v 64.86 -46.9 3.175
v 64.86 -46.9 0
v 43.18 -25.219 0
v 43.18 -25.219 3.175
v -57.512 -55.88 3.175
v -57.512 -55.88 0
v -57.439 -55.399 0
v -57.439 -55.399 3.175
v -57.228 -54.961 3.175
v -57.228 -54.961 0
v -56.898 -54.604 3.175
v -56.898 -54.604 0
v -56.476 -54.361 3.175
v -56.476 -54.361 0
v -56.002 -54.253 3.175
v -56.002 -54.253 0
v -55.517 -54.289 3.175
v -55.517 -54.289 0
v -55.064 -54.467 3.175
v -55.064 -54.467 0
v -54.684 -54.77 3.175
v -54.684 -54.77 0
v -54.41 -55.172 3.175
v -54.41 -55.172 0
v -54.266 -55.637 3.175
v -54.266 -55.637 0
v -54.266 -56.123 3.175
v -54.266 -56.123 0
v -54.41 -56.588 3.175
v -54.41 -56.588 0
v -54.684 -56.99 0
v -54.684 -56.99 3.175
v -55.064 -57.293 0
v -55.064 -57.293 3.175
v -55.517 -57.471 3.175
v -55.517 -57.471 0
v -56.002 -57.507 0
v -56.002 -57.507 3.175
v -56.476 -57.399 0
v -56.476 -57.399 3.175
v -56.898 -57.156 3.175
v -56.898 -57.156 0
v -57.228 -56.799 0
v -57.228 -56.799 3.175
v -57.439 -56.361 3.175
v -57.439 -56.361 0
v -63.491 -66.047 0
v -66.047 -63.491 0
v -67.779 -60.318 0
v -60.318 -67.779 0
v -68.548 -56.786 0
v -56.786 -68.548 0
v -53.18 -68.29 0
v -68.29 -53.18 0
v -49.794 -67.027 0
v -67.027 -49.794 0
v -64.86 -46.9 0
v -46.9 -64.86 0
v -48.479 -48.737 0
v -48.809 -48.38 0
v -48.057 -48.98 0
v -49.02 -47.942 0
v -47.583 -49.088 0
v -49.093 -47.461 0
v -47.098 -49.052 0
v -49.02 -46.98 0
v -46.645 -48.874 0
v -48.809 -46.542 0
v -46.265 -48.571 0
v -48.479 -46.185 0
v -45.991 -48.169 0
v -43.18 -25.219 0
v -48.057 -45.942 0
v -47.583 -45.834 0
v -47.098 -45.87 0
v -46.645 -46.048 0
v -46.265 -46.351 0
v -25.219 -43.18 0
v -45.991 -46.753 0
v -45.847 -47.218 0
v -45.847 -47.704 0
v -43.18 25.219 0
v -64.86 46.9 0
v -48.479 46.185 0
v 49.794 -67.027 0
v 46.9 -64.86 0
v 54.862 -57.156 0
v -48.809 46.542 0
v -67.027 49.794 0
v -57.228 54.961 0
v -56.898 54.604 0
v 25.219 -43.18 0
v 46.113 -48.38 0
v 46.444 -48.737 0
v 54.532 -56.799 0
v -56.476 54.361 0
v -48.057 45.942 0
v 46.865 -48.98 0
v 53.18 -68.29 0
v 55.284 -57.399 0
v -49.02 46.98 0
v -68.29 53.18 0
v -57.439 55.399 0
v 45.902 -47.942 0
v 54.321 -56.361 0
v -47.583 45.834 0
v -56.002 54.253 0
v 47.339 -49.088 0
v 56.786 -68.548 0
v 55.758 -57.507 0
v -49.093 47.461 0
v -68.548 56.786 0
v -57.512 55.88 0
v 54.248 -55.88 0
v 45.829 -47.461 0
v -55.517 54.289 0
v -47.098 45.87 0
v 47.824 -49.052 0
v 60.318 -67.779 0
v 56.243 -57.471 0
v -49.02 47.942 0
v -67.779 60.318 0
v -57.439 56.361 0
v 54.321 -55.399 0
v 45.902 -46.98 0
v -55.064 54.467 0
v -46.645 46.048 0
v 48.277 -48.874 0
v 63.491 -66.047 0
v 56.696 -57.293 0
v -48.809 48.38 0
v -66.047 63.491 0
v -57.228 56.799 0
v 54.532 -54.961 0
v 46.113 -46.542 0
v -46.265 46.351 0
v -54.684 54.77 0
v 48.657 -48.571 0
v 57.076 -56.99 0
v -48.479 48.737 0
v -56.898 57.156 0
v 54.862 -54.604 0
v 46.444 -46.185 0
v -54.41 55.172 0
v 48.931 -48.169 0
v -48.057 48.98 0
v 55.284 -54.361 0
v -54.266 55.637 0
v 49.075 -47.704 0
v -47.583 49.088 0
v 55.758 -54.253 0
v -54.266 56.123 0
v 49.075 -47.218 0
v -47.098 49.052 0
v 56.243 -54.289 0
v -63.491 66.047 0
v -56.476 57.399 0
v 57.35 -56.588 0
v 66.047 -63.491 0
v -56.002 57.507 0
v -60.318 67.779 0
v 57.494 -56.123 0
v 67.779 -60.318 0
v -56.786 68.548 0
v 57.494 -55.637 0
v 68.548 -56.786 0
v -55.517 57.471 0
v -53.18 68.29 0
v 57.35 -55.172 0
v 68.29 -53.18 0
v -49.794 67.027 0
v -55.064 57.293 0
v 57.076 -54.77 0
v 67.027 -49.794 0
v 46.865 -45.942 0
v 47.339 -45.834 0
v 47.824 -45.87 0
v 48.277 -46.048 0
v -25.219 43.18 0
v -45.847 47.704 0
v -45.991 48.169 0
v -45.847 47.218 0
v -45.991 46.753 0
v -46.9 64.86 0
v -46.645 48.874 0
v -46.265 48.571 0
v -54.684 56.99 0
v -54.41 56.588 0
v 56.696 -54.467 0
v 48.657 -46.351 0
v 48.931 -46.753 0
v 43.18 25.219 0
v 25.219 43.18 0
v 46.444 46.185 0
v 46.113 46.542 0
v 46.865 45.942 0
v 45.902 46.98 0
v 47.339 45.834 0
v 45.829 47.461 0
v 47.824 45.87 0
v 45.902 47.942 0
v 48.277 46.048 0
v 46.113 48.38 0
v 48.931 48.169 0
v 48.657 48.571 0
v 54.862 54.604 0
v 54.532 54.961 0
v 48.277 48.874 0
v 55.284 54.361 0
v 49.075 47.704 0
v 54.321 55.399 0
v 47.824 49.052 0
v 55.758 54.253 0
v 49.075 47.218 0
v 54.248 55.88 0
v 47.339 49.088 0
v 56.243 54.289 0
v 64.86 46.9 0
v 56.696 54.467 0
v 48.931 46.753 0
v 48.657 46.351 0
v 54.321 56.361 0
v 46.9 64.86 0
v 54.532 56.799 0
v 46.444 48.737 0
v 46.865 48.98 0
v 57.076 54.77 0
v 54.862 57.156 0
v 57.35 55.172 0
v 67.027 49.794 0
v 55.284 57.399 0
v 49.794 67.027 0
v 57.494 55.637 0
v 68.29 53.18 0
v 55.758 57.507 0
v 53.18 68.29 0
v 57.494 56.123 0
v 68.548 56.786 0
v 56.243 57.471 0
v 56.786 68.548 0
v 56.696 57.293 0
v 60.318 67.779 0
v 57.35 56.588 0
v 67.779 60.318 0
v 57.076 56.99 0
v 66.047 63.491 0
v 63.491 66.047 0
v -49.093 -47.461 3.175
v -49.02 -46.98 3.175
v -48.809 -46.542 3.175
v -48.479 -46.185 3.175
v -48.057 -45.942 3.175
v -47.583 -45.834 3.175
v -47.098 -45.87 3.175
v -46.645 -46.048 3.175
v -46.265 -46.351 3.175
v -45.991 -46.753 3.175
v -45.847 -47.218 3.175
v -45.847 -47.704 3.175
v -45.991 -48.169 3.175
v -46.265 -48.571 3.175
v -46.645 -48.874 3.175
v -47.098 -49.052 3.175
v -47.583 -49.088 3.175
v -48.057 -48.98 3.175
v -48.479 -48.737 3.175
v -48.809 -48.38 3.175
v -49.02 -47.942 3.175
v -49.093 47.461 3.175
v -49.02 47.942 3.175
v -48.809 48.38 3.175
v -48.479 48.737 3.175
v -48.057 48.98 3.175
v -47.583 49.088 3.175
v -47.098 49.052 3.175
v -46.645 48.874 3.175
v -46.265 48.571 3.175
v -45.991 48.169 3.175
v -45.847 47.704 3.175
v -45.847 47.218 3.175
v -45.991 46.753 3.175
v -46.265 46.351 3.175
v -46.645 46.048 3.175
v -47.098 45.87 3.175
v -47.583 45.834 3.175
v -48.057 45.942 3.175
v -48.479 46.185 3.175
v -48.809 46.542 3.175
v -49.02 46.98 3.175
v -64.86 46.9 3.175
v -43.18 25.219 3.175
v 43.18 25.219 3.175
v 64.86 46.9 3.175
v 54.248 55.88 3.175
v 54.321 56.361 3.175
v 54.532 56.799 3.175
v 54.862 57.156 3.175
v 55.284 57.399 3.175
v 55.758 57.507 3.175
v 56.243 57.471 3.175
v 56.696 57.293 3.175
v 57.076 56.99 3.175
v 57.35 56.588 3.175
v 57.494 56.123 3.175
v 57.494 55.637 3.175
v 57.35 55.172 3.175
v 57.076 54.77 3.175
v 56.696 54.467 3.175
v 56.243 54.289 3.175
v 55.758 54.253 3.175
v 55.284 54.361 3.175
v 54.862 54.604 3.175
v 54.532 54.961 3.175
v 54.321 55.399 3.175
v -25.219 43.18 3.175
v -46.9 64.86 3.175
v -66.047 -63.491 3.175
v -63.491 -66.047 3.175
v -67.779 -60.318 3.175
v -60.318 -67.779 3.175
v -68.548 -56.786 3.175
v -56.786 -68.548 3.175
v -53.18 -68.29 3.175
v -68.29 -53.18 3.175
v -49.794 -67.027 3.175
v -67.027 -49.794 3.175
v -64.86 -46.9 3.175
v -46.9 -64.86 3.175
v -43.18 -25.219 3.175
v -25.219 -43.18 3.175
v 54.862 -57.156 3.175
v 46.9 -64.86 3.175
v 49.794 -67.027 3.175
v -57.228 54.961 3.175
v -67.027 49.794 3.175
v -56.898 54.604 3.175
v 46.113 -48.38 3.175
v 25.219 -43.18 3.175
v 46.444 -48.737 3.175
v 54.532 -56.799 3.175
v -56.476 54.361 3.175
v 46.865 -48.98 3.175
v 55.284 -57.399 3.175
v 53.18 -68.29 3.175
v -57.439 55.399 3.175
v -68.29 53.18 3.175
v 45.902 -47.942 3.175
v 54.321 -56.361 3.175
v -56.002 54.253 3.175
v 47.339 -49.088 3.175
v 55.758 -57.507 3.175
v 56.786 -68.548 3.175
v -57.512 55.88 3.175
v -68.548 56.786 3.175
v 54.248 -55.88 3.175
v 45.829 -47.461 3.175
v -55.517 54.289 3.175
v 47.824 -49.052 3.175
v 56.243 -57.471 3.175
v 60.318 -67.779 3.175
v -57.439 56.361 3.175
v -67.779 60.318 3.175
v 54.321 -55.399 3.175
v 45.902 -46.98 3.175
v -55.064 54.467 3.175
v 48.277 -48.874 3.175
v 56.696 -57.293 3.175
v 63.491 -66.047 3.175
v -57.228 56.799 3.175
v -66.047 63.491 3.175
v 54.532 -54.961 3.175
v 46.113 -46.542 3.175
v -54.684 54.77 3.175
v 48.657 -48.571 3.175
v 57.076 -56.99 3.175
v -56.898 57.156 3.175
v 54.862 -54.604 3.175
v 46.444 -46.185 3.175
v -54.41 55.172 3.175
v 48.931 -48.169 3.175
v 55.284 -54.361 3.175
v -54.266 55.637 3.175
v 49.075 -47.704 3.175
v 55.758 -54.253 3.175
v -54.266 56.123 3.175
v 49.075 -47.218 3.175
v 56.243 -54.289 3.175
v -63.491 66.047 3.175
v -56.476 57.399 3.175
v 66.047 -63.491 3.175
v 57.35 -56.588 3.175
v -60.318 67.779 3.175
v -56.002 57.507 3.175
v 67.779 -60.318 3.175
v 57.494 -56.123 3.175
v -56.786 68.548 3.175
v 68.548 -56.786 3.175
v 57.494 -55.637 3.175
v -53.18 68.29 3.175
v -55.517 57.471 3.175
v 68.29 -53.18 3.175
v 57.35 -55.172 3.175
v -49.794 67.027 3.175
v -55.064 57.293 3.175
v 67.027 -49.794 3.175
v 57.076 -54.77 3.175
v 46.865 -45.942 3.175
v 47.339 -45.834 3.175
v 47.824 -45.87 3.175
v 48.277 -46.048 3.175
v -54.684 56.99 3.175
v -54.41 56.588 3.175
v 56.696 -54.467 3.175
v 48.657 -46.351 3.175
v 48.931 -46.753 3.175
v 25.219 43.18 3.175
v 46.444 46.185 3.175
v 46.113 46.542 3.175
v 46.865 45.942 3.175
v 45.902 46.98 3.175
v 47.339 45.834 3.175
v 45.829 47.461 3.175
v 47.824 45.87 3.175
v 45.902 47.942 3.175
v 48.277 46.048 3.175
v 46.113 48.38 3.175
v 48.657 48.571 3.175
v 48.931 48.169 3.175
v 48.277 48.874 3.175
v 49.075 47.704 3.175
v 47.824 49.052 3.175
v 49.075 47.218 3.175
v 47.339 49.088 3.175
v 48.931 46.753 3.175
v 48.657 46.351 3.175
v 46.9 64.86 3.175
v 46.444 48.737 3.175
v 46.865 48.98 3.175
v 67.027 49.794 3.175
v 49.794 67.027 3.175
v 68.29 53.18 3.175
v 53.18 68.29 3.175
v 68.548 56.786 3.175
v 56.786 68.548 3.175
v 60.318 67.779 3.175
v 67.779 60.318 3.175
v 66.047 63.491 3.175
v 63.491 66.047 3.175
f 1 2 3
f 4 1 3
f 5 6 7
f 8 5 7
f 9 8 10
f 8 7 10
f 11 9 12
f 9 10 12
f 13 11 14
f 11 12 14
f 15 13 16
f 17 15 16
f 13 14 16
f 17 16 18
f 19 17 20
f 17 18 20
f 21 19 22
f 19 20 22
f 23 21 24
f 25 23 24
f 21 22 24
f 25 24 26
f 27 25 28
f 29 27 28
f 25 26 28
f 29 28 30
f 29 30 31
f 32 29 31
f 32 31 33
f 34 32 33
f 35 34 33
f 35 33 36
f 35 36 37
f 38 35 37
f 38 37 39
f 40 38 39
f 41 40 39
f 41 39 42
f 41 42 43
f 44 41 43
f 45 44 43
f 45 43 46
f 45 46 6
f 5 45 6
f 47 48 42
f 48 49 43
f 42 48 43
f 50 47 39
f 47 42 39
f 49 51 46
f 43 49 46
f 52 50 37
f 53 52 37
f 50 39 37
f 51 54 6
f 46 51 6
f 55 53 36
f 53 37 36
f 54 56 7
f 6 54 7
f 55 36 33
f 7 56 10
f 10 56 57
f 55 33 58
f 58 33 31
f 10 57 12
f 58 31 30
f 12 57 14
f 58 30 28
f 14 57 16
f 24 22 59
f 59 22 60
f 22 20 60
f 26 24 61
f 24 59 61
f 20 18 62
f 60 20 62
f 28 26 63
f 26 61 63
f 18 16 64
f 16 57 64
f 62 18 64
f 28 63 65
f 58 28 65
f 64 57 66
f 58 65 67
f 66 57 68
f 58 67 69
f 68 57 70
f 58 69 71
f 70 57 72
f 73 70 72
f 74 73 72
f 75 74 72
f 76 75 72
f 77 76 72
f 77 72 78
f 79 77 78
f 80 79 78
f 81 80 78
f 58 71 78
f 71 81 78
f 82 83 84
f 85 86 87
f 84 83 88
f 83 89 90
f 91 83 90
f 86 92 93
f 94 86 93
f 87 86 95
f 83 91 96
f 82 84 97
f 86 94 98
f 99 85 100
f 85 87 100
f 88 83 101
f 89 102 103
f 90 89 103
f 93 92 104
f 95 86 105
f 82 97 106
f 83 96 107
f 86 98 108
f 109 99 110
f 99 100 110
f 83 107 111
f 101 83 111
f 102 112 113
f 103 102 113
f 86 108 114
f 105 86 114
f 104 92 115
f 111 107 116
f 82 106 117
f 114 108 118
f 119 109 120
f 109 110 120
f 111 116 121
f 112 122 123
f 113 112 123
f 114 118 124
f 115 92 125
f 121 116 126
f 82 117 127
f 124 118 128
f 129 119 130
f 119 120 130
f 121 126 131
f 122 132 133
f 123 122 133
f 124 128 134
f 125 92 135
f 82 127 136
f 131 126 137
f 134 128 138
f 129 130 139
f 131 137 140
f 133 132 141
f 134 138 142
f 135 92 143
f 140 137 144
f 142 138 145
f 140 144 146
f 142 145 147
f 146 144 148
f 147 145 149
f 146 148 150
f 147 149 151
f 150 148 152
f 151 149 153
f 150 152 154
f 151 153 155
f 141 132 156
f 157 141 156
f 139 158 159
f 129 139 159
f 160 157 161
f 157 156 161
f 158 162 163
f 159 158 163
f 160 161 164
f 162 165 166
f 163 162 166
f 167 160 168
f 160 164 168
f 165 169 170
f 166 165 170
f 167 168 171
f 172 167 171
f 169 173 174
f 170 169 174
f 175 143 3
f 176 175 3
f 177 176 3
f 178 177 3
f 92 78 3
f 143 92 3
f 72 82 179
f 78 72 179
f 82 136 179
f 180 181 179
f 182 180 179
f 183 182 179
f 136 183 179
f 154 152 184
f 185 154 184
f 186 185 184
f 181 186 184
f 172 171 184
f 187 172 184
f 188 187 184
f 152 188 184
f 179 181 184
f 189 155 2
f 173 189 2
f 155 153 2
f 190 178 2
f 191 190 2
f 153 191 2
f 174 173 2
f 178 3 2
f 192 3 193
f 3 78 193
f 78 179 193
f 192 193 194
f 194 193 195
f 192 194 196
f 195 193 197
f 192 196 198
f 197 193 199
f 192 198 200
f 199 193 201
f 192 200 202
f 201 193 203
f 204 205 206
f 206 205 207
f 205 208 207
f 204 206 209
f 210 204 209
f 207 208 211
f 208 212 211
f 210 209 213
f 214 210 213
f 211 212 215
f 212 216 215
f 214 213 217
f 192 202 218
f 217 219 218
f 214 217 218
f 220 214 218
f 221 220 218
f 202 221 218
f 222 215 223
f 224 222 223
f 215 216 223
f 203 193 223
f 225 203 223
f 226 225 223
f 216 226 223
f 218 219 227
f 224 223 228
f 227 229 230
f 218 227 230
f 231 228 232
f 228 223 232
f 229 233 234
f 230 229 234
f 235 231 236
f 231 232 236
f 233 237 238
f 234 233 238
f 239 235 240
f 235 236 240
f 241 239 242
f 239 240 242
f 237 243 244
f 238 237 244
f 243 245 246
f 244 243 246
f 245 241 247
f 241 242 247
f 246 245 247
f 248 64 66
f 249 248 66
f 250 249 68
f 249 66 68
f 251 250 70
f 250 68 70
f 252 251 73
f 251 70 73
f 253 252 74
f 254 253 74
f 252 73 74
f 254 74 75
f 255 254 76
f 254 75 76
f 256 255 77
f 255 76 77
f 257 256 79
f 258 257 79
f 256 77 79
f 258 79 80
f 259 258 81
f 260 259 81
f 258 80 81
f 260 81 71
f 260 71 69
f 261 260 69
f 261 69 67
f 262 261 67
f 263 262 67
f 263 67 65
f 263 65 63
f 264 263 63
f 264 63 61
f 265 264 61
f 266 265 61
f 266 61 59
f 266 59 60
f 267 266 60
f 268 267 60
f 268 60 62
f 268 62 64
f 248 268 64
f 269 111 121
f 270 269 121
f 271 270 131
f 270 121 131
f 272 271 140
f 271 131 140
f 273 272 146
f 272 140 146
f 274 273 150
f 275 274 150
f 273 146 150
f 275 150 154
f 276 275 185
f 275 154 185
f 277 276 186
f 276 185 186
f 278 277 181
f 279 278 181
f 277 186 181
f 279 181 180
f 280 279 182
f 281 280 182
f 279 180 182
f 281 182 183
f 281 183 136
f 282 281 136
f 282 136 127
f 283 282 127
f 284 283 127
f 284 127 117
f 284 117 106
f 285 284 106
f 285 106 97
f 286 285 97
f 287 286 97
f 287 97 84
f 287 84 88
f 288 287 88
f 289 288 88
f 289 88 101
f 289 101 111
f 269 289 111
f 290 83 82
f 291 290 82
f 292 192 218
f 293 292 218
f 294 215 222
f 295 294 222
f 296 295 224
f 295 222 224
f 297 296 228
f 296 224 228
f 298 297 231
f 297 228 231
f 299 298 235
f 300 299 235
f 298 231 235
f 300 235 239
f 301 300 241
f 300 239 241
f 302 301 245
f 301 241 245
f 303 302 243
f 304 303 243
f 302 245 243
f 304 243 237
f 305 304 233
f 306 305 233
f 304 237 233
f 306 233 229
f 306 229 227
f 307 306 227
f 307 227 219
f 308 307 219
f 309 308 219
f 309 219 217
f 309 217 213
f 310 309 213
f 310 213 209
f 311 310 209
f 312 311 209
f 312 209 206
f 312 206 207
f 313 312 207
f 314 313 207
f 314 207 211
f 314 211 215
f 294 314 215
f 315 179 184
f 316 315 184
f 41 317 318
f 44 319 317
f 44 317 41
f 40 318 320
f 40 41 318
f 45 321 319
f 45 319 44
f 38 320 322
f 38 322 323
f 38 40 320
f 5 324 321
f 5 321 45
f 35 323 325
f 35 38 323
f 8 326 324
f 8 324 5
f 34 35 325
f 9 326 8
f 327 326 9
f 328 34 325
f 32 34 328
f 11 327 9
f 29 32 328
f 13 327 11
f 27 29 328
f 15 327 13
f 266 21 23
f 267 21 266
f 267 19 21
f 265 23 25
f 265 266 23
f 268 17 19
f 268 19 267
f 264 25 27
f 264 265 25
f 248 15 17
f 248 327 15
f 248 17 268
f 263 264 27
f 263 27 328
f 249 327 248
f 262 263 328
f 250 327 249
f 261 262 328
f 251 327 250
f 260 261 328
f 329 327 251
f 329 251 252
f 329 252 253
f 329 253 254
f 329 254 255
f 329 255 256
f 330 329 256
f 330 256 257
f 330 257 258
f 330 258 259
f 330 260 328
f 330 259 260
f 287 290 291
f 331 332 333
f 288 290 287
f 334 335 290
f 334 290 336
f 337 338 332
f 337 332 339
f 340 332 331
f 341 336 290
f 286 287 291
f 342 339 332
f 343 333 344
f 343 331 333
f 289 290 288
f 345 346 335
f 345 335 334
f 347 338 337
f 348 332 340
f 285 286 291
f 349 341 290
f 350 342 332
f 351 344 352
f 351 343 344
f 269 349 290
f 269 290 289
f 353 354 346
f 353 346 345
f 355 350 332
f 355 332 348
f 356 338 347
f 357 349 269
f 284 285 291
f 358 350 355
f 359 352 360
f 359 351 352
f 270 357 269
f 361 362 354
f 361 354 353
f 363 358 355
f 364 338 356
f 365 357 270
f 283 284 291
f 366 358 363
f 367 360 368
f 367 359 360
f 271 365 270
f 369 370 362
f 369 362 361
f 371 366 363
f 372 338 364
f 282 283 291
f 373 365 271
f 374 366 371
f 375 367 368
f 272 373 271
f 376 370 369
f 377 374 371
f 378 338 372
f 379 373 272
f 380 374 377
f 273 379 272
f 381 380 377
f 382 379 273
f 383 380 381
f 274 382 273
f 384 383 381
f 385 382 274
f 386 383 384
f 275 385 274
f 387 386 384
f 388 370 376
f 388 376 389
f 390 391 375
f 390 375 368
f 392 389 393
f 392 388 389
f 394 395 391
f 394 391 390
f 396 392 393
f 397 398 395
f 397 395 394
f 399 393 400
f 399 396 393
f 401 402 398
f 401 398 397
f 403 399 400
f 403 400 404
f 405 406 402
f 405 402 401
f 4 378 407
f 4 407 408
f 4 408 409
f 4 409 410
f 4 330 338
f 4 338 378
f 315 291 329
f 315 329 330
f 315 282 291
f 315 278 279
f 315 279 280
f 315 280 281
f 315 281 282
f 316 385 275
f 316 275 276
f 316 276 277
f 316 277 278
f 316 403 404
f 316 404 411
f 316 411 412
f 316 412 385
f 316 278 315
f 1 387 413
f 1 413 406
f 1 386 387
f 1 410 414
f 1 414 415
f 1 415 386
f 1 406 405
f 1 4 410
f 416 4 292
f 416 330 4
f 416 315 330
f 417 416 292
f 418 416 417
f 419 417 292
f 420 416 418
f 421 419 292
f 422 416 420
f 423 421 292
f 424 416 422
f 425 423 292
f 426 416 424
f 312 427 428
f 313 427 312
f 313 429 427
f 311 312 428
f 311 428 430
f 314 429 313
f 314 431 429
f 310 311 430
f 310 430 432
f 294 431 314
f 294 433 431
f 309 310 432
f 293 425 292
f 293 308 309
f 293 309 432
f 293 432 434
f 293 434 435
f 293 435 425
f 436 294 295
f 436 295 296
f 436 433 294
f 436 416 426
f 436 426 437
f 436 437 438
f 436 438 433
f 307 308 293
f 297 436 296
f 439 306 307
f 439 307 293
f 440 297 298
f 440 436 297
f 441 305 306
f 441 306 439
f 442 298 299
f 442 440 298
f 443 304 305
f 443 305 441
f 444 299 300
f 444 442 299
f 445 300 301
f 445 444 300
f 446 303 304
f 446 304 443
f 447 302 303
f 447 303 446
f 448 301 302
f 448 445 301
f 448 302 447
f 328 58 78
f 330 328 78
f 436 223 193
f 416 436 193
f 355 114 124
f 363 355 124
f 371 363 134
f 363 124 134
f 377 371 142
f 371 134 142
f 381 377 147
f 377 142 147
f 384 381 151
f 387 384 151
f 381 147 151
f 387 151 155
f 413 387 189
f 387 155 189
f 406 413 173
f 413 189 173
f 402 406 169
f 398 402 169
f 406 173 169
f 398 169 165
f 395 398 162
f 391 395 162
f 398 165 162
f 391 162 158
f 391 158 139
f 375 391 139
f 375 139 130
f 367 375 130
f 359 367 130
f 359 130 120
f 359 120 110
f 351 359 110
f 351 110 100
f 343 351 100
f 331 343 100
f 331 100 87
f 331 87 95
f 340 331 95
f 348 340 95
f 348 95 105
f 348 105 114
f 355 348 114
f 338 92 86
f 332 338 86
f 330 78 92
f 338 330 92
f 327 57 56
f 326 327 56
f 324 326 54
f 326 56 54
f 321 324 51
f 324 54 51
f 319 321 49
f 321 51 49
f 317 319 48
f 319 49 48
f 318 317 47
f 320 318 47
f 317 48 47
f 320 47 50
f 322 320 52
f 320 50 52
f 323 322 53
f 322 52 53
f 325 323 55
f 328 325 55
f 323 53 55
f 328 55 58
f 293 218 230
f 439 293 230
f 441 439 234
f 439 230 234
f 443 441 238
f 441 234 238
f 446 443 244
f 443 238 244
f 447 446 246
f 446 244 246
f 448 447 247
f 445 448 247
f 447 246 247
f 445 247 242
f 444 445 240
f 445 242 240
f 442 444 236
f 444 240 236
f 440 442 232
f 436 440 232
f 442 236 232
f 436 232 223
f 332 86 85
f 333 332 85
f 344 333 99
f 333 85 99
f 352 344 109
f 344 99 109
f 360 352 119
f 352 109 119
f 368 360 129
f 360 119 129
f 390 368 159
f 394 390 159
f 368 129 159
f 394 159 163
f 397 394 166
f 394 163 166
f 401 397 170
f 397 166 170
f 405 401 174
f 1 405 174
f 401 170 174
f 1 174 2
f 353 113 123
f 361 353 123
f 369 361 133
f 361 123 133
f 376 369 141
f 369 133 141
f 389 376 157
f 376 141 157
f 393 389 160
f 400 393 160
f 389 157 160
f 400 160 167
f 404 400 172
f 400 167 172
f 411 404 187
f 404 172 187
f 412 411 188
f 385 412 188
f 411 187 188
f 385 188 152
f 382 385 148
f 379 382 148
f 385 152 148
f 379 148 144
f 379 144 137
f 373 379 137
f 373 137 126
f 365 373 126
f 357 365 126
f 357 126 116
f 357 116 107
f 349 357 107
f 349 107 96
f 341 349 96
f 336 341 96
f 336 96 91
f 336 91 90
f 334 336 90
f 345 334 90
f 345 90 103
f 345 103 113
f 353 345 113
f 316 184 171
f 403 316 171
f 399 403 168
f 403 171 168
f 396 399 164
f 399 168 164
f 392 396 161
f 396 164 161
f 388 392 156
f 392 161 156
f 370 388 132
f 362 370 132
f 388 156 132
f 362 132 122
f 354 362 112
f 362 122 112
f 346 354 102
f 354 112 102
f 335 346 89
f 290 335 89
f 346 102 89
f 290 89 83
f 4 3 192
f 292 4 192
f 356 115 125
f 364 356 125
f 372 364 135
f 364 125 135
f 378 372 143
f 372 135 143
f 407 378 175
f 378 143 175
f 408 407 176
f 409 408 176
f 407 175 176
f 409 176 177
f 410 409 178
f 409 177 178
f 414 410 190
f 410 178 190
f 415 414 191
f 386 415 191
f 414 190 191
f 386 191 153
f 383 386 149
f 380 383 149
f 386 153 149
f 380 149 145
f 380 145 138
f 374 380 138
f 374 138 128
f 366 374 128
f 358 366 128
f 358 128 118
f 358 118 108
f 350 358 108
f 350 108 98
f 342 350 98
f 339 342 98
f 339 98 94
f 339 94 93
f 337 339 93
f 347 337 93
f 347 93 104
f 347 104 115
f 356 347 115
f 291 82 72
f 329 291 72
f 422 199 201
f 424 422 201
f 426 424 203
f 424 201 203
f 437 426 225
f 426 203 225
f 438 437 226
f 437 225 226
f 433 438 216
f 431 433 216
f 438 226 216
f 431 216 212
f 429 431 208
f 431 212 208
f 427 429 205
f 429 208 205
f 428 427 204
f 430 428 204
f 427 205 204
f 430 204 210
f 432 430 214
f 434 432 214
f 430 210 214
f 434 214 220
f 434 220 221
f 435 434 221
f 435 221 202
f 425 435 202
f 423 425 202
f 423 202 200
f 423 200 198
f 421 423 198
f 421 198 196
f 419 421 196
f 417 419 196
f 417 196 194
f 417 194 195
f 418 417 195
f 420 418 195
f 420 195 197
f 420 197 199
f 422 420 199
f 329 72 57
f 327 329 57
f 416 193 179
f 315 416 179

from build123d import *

# Parameters (mm, degrees)
F1_DEPTH = 3.175
F3_D     = 3.2639
F5_D     = 3.2639


with BuildPart() as f1:
    # F0 (on Top) → F1 (new body)
    with BuildSketch(Plane.XY):
        with BuildLine():
            Line((-25.2194877579, 43.18), (-46.8997438789, 64.8602561211))
            ThreePointArc((-46.8997438789, 64.8602561211), (-64.8602561211, 64.8602561211), (-64.8602561211, 46.8997438789))
            Line((-64.8602561211, 46.8997438789), (-43.18, 25.2194877579))
            Line((-43.18, 25.2194877579), (-43.18, -25.2194877579))
            Line((-43.18, -25.2194877579), (-64.8602561211, -46.8997438789))
            ThreePointArc((-64.8602561211, -46.8997438789), (-64.8602561211, -64.8602561211), (-46.8997438789, -64.8602561211))
            Line((-46.8997438789, -64.8602561211), (-25.2194877579, -43.18))
            Line((-25.2194877579, -43.18), (25.2194877579, -43.18))
            Line((25.2194877579, -43.18), (46.8997438789, -64.8602561211))
            ThreePointArc((46.8997438789, -64.8602561211), (64.8602561211, -64.8602561211), (64.8602561211, -46.8997438789))
            Line((64.8602561211, -46.8997438789), (43.18, -25.2194877579))
            Line((43.18, -25.2194877579), (43.18, 25.2194877579))
            Line((43.18, 25.2194877579), (64.8602561211, 46.8997438789))
            ThreePointArc((64.8602561211, 46.8997438789), (64.8602561211, 64.8602561211), (46.8997438789, 64.8602561211))
            Line((46.8997438789, 64.8602561211), (25.2194877579, 43.18))
            Line((25.2194877579, 43.18), (-25.2194877579, 43.18))
        make_face()
    extrude(amount=F1_DEPTH)

    # F3 (through all)
    with Locations(Plane.XY.offset(3.175)):
        with Locations((-55.88, 55.88), (55.88, 55.88), (55.88, -55.88), (-55.88, -55.88)):
            Hole(F3_D / 2)

    # F5 (through all)
    with Locations(Plane.XY.offset(3.175)):
        with Locations((-47.4610098865, 47.4610098865), (47.4610098865, 47.4610098865), (47.4610098865, -47.4610098865), (-47.4610098865, -47.4610098865)):
            Hole(F5_D / 2)


solid = f1.part
